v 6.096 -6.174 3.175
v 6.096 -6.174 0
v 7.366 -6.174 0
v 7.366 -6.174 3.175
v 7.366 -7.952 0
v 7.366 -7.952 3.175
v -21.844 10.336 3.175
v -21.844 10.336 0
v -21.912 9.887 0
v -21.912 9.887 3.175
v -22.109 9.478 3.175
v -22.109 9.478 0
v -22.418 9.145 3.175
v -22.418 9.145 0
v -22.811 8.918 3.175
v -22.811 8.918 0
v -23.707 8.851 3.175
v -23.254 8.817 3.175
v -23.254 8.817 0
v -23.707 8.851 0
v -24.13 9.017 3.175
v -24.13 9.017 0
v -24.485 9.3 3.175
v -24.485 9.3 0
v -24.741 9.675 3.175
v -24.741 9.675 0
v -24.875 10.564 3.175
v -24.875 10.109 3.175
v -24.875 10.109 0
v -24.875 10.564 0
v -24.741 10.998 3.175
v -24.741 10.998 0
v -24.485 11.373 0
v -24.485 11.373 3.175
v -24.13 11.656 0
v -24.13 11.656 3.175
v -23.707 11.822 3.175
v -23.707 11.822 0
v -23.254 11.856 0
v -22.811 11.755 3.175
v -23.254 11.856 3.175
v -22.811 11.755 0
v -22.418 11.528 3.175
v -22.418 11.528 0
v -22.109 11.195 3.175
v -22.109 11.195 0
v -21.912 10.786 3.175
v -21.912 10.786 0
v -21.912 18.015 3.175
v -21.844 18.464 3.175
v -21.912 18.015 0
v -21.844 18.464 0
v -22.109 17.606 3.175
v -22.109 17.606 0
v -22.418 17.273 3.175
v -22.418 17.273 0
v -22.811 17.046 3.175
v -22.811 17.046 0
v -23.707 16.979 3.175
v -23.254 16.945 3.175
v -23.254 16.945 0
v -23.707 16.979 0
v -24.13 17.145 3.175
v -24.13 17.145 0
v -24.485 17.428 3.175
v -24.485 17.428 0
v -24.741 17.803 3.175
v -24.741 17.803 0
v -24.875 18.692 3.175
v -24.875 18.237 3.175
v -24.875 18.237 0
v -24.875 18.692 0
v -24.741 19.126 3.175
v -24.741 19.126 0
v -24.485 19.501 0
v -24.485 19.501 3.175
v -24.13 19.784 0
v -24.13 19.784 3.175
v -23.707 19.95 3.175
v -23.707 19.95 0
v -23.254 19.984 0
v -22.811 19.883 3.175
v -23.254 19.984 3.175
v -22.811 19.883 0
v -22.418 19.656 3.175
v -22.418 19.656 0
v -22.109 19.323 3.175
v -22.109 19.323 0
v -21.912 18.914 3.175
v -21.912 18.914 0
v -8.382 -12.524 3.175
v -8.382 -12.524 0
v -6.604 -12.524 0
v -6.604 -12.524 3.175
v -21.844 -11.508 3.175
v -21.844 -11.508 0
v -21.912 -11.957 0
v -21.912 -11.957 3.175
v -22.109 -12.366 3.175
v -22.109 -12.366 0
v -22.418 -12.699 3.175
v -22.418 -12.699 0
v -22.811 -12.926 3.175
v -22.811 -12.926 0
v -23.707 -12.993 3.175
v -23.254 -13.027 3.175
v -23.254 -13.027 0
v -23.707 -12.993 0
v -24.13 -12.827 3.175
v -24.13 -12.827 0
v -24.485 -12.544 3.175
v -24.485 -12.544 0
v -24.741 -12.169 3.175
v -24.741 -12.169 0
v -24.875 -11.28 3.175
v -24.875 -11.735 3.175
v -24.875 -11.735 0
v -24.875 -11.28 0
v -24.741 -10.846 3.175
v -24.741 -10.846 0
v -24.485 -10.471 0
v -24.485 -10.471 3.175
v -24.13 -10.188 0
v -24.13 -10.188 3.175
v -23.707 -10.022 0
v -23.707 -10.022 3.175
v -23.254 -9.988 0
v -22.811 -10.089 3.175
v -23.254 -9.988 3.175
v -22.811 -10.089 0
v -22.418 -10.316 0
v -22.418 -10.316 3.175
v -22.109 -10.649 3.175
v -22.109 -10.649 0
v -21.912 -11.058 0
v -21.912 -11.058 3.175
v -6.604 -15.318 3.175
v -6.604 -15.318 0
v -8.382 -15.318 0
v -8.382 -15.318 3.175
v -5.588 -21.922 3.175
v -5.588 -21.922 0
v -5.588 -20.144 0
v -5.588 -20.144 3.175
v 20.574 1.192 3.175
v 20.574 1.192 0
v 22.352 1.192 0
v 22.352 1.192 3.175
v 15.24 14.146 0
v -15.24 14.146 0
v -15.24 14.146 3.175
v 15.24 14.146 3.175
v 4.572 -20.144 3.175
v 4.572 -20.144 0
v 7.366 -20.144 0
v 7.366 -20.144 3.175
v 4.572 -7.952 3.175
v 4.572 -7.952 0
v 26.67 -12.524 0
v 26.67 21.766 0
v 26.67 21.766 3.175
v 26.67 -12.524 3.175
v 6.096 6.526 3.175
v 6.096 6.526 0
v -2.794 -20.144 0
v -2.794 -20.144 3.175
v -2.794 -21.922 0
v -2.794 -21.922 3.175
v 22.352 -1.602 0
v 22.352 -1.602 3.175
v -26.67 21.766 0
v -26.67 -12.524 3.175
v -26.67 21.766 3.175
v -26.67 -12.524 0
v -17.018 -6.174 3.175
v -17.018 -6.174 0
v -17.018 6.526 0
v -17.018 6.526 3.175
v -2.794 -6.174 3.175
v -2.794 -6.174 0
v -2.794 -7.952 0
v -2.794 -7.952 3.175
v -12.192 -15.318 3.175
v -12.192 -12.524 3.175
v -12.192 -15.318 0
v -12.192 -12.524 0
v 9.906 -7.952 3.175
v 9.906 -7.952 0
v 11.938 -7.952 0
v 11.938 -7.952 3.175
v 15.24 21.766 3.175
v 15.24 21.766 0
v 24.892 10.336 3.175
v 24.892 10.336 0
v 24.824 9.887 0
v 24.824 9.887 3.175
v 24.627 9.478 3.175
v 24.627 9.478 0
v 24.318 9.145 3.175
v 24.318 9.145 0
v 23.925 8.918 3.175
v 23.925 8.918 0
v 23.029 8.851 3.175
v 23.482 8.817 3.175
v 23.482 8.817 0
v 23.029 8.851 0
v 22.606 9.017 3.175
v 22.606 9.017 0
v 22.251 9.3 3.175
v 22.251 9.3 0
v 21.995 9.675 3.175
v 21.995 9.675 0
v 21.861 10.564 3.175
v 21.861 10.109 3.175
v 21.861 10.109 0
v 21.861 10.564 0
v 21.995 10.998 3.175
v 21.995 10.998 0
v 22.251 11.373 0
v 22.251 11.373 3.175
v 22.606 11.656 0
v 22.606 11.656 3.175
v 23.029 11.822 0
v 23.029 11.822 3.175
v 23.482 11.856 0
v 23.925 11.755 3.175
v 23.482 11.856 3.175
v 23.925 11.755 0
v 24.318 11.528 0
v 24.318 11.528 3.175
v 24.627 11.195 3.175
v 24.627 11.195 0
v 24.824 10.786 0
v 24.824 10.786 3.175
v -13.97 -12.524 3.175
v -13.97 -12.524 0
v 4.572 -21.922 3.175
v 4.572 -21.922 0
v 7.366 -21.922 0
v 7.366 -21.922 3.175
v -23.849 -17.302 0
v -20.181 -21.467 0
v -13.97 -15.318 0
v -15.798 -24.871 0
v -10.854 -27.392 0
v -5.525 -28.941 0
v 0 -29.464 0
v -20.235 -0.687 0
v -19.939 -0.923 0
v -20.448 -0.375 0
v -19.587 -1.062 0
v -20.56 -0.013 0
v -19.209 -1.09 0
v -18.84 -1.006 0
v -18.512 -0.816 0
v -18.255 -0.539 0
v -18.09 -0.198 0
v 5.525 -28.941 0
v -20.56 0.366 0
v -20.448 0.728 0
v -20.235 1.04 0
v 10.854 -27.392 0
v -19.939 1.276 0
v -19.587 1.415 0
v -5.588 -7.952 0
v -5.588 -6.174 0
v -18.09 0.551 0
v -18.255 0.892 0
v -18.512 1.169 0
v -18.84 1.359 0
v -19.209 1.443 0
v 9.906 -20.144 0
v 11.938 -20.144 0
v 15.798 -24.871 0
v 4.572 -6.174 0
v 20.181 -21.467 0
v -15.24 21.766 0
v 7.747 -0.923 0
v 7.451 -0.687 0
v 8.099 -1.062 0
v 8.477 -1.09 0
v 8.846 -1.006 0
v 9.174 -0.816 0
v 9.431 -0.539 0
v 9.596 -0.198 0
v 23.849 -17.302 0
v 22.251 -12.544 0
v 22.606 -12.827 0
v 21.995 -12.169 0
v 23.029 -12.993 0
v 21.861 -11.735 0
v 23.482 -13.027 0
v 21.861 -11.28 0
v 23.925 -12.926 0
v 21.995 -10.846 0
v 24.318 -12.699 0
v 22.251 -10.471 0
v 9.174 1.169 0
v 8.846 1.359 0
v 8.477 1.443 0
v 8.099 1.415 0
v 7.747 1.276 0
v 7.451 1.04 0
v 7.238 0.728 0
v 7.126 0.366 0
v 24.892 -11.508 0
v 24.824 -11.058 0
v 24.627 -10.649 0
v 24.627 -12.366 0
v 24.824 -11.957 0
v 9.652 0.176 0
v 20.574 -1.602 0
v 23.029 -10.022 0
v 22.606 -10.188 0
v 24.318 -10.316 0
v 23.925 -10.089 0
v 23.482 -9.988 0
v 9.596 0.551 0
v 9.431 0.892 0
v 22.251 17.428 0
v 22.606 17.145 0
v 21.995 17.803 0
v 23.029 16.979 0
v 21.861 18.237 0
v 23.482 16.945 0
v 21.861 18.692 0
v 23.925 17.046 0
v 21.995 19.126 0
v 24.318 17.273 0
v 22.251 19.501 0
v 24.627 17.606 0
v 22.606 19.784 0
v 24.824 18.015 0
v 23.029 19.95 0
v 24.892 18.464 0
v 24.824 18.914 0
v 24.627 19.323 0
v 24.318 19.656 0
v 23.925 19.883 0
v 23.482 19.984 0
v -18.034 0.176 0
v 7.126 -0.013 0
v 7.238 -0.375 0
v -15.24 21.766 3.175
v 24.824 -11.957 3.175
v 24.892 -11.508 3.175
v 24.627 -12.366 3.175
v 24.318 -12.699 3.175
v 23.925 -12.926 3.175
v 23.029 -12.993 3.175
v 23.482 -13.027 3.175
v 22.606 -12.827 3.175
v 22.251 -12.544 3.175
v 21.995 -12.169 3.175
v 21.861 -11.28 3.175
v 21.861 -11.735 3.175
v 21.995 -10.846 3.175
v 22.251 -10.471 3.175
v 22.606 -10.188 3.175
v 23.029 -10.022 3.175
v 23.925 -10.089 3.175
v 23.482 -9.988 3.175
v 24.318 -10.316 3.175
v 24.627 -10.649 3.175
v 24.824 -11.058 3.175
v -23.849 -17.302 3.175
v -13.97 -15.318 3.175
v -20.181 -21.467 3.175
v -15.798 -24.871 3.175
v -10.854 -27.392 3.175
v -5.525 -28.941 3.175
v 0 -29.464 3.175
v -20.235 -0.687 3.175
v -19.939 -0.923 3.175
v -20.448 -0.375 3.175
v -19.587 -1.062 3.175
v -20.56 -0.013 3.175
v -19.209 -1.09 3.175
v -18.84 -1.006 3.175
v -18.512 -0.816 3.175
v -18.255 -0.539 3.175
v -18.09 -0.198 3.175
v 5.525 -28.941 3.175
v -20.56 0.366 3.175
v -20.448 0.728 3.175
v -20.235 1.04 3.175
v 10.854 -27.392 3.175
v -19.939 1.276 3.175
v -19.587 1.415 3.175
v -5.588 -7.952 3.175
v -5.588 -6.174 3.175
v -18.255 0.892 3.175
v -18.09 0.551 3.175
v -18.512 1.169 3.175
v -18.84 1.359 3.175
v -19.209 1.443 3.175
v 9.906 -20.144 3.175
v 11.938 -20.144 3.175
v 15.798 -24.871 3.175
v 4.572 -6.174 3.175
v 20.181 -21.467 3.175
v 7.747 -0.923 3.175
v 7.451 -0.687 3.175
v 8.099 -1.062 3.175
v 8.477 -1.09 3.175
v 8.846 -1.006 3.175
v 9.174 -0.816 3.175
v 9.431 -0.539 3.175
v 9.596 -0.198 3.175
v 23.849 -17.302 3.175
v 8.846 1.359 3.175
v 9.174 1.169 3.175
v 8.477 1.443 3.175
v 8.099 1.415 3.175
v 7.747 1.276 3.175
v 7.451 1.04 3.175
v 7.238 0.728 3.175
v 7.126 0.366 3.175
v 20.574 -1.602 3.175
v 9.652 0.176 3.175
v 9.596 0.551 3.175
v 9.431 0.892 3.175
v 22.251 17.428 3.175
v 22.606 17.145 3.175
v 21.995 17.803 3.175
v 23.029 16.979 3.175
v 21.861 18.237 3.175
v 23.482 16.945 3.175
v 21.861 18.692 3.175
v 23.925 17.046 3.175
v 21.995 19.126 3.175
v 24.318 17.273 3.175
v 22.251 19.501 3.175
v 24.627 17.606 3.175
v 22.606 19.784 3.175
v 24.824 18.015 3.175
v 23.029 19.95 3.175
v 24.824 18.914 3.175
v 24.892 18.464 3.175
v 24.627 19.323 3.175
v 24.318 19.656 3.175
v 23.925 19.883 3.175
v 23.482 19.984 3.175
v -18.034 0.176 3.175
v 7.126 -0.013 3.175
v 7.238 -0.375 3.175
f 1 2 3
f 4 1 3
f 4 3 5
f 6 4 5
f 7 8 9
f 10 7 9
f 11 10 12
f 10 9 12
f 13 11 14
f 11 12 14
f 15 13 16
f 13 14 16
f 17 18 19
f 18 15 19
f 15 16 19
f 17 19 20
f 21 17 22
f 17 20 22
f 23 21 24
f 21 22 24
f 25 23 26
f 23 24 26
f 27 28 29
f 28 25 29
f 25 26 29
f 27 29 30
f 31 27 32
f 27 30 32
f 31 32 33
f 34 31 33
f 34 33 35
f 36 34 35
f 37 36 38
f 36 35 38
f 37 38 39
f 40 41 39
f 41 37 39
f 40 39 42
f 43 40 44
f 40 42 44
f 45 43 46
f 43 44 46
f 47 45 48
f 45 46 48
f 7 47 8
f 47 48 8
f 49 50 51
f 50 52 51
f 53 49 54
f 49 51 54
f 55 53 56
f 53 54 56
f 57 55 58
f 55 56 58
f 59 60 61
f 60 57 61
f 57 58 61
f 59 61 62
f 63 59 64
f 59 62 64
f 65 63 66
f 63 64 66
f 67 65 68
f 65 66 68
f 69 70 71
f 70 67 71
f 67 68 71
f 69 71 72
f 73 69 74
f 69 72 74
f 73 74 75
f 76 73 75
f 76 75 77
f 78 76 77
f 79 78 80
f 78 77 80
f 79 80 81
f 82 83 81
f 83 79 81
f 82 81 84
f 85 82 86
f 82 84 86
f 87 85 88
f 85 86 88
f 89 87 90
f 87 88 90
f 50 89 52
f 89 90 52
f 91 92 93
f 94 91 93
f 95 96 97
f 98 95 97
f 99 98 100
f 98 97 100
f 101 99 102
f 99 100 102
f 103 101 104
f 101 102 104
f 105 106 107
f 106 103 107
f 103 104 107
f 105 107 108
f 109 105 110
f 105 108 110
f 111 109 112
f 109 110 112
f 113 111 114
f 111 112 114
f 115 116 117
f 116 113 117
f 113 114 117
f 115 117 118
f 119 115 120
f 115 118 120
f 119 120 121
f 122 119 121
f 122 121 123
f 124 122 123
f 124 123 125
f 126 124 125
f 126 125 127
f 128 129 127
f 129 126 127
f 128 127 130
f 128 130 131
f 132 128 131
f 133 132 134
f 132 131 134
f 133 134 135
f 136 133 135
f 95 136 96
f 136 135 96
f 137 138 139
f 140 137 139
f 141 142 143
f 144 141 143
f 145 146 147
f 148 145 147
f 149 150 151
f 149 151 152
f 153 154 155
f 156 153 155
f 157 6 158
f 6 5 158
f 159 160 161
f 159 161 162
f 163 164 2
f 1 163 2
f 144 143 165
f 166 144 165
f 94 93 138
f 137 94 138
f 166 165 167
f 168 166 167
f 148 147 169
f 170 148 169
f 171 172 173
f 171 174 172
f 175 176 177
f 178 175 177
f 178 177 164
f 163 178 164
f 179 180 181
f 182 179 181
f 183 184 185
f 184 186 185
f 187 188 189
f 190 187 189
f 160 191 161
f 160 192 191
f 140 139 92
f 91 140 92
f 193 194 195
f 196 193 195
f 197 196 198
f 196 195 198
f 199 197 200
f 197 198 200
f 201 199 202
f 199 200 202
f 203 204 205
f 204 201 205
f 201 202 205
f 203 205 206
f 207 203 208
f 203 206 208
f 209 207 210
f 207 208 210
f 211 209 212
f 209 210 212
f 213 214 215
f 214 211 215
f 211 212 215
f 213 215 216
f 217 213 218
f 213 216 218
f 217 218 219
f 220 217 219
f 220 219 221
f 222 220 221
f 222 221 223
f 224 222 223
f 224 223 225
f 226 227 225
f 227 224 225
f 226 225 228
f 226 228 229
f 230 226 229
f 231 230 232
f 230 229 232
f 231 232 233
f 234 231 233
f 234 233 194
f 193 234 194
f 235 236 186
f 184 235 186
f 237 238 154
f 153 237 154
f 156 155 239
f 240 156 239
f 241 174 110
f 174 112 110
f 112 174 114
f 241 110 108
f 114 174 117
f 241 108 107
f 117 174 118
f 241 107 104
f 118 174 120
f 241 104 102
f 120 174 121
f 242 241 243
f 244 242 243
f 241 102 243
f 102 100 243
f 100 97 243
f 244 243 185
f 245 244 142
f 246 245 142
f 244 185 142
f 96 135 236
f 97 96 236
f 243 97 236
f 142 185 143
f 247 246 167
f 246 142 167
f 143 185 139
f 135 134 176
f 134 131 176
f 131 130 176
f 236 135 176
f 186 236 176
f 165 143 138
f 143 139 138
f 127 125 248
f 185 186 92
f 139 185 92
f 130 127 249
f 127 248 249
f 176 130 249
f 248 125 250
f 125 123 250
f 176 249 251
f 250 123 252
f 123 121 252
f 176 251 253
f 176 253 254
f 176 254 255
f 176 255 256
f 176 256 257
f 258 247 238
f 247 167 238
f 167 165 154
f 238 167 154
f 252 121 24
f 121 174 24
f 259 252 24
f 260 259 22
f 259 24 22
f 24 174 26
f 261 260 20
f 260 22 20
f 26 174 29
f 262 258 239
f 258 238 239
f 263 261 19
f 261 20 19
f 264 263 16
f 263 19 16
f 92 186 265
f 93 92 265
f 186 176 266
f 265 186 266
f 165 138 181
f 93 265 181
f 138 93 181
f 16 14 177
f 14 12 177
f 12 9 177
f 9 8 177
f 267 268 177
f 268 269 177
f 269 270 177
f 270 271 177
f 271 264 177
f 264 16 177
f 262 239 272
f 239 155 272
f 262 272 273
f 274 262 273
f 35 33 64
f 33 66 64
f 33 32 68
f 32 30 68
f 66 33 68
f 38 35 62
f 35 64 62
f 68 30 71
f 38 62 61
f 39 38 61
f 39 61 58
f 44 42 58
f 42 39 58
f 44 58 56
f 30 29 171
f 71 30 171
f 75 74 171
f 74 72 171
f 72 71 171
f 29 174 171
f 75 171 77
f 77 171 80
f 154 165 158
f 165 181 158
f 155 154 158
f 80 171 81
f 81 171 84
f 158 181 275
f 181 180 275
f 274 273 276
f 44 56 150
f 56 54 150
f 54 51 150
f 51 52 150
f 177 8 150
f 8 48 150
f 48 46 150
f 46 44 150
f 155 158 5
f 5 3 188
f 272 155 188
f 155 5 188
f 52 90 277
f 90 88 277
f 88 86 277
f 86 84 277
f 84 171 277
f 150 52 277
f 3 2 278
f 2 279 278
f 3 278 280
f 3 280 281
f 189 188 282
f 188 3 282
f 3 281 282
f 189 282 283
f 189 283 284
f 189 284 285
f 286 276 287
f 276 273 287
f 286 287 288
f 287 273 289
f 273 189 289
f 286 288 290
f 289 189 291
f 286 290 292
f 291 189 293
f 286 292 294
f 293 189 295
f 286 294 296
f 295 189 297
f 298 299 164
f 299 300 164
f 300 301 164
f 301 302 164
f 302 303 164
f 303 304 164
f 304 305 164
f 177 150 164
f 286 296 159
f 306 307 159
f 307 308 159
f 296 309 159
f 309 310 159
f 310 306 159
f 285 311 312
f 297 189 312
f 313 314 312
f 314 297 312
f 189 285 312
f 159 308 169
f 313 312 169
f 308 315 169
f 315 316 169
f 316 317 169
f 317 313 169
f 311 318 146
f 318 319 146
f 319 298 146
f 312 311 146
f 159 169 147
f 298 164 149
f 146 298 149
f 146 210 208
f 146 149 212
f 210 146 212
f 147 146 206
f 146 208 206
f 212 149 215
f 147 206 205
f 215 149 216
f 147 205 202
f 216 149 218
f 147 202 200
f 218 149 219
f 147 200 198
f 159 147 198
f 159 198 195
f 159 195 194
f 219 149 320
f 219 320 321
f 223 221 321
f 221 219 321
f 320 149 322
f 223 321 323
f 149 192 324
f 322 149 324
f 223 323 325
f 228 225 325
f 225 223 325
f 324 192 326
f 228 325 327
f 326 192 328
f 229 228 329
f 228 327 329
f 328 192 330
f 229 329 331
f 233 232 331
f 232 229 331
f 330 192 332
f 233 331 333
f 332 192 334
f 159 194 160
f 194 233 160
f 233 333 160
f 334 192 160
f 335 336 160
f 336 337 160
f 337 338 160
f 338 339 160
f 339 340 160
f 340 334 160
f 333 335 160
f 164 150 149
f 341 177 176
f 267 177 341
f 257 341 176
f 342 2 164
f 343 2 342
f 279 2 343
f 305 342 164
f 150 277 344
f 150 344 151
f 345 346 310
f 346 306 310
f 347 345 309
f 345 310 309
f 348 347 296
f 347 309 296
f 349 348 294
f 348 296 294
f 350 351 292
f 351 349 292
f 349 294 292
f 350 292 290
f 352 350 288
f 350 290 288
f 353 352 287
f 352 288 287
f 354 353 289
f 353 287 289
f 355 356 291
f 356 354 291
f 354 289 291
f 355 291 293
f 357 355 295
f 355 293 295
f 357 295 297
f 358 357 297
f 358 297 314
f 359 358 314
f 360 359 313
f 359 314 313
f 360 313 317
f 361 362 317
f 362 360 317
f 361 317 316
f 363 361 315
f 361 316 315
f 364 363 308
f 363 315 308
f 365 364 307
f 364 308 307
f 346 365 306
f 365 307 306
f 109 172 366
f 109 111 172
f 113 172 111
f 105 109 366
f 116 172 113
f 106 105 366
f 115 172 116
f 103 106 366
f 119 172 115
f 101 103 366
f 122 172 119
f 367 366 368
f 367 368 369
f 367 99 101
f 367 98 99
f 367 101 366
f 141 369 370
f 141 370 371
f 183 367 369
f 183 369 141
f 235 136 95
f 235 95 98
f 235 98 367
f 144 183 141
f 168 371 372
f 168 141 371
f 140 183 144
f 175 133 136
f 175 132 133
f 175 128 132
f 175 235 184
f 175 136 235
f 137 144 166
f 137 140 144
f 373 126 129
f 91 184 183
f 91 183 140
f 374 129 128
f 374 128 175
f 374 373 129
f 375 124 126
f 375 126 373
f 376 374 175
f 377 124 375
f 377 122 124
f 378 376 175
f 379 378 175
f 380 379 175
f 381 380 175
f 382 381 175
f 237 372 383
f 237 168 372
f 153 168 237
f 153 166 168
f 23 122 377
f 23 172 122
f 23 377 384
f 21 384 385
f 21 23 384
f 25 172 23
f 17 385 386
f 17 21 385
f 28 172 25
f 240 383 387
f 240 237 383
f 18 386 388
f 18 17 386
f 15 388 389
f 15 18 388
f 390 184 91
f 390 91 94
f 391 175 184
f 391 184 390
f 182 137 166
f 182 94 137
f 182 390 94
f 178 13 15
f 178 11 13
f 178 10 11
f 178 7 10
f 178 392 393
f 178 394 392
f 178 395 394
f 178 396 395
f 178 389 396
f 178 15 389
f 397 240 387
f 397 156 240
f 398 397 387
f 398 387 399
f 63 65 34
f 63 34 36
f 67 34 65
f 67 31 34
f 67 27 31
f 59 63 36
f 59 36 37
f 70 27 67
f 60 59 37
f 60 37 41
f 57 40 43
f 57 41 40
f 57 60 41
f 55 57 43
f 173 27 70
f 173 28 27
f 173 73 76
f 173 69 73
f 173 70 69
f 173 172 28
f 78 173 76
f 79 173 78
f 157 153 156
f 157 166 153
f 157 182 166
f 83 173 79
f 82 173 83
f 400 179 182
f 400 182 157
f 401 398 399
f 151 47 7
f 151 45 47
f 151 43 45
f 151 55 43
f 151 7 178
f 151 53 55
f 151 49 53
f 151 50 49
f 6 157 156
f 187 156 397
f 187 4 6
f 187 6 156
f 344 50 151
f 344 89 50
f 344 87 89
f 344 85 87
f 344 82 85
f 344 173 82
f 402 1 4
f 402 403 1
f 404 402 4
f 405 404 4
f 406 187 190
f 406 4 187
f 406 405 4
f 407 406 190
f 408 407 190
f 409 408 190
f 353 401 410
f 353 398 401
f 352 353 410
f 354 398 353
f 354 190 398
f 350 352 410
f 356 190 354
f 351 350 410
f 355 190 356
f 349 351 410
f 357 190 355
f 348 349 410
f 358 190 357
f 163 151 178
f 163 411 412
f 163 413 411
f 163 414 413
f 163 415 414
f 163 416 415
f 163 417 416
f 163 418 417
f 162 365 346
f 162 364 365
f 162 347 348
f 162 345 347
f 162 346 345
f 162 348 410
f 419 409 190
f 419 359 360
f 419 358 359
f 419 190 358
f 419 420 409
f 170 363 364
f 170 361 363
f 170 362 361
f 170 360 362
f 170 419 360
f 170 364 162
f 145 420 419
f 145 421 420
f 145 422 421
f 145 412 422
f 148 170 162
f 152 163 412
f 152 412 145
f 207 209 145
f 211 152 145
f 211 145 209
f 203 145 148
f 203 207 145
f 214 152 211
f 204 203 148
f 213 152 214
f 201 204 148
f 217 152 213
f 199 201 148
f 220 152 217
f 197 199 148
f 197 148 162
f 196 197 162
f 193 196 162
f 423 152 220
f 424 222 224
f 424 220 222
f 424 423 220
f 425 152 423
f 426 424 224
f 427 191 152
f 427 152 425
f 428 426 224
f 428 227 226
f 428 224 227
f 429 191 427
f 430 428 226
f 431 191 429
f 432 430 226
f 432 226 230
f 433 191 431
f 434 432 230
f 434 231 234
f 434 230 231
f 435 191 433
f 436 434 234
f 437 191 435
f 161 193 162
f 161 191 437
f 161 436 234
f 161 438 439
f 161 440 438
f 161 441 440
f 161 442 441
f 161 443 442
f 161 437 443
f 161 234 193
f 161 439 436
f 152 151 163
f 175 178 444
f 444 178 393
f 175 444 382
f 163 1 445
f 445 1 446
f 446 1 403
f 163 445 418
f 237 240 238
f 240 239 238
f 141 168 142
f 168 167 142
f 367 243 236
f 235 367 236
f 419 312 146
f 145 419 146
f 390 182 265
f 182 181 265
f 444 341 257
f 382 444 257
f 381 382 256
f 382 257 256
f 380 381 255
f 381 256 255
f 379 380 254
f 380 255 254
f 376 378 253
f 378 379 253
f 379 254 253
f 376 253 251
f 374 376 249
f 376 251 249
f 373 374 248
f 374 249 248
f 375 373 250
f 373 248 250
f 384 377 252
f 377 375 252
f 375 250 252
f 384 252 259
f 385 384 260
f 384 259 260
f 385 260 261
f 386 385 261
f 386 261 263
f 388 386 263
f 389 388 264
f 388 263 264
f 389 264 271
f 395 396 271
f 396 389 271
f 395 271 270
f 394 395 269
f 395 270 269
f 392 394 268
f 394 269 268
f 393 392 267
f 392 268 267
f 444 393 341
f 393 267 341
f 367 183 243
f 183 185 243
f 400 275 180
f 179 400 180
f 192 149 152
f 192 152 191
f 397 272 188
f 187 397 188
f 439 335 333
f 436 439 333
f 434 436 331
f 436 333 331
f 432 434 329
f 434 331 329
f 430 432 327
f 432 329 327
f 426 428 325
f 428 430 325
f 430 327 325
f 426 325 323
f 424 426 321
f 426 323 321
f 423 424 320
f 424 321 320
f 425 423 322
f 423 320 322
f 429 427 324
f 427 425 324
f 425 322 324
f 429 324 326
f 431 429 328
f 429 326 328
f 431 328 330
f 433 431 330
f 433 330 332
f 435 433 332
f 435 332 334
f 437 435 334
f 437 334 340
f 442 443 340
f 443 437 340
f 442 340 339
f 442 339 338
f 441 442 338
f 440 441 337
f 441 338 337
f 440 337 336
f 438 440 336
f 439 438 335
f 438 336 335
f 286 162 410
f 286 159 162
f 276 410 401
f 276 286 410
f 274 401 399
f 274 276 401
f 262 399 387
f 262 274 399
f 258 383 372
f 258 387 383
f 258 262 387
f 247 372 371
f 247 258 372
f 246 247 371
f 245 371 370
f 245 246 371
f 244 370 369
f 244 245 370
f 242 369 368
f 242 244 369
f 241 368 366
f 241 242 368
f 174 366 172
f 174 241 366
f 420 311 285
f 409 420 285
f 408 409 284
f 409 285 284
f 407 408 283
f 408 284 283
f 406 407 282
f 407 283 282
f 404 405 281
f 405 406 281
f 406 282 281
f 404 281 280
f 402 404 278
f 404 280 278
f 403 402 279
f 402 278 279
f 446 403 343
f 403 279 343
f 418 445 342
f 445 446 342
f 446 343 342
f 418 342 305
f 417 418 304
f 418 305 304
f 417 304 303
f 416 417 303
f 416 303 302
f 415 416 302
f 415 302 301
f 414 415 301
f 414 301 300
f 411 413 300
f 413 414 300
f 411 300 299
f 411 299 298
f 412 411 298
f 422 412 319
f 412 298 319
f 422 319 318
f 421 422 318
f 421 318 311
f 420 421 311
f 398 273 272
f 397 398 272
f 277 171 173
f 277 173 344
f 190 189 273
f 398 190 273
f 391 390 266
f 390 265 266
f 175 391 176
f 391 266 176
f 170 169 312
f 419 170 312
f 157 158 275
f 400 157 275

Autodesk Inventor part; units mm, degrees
ref_plane "YZ Plane" through (0, 0, 0) normal (1, 0, 0) x (0, 1, 0)
ref_plane "XZ Plane" through (0, 0, 0) normal (0, 1, 0) x (-1, 0, 0)
ref_plane "XY Plane" through (0, 0, 0) normal (0, 0, 1) x (1, 0, 0)
sketch "Sketch1" plane through (0, 0, 0) normal (0, 0, 1) x (1, 0, 0)
  arc A0 (-26.67, -12.5235) -> (26.67, -12.5235) centre (0, 0) ccw
  line L0 (-26.67, -12.5235) -> (-26.67, 21.7665)
  line L1 (-26.67, 21.7665) -> (-15.24, 21.7665)
  line L2 (-15.24, 21.7665) -> (-15.24, 14.1465)
  line L3 (-15.24, 14.1465) -> (15.24, 14.1465)
  line L4 (15.24, 14.1465) -> (15.24, 21.7665)
  line L5 (15.24, 21.7665) -> (26.67, 21.7665)
  line L6 (26.67, 21.7665) -> (26.67, -12.5235)
  line L7 (-17.018, 6.5265) -> (6.096, 6.5265)
  line L8 (6.096, 6.5265) -> (6.096, -6.1735)
  line L9 (6.096, -6.1735) -> (-17.018, -6.1735)
  line L10 (-17.018, -6.1735) -> (-17.018, 6.5265)
  line L11 (-5.588, -6.1735) -> (-2.794, -6.1735)
  line L12 (-2.794, -6.1735) -> (-2.794, -7.9515)
  line L13 (-2.794, -7.9515) -> (-5.588, -7.9515)
  line L14 (-5.588, -7.9515) -> (-5.588, -6.1735)
  line L15 (4.572, -6.1735) -> (7.366, -6.1735)
  line L16 (7.366, -6.1735) -> (7.366, -7.9515)
  line L17 (7.366, -7.9515) -> (4.572, -7.9515)
  line L18 (4.572, -7.9515) -> (4.572, -6.1735)
  line L19 (9.906, -7.9515) -> (11.938, -7.9515)
  line L20 (11.938, -7.9515) -> (11.938, -20.1435)
  line L21 (11.938, -20.1435) -> (9.906, -20.1435)
  line L22 (9.906, -20.1435) -> (9.906, -7.9515)
  line L23 (-5.588, -20.1435) -> (-2.794, -20.1435)
  line L24 (-2.794, -20.1435) -> (-2.794, -21.9215)
  line L25 (-2.794, -21.9215) -> (-5.588, -21.9215)
  line L26 (-5.588, -21.9215) -> (-5.588, -20.1435)
  line L27 (-8.382, -12.5235) -> (-6.604, -12.5235)
  line L28 (-6.604, -12.5235) -> (-6.604, -15.3175)
  line L29 (-6.604, -15.3175) -> (-8.382, -15.3175)
  line L30 (-8.382, -15.3175) -> (-8.382, -12.5235)
  line L31 (-13.97, -12.5235) -> (-12.192, -12.5235)
  line L32 (-12.192, -12.5235) -> (-12.192, -15.3175)
  line L33 (-12.192, -15.3175) -> (-13.97, -15.3175)
  line L34 (-13.97, -15.3175) -> (-13.97, -12.5235)
  line L35 (20.574, 1.1925) -> (22.352, 1.1925)
  line L36 (22.352, 1.1925) -> (22.352, -1.6015)
  line L37 (22.352, -1.6015) -> (20.574, -1.6015)
  line L38 (20.574, -1.6015) -> (20.574, 1.1925)
  line L39 (4.572, -20.1435) -> (7.366, -20.1435)
  line L40 (7.366, -20.1435) -> (7.366, -21.9215)
  line L41 (7.366, -21.9215) -> (4.572, -21.9215)
  line L42 (4.572, -21.9215) -> (4.572, -20.1435)
  circle A1 centre (-23.368, 18.4645) radius 1.524
  circle A2 centre (-23.368, 10.3365) radius 1.524
  circle A3 centre (-23.368, -11.5075) radius 1.524
  circle A4 centre (-19.304, 0.1765) radius 1.27
  circle A5 centre (8.382, 0.1765) radius 1.27
  circle A6 centre (23.368, 18.4645) radius 1.524
  circle A7 centre (23.368, 10.3365) radius 1.524
  circle A8 centre (23.368, -11.5075) radius 1.524
  dimension "d0" = 29.464
  dimension "d1" = 34.29
  dimension "d2" = 11.43
  dimension "d3" = 7.62
  dimension "d4" = 30.48
  dimension "d5" = 2.794
  dimension "d6" = 12.7
  dimension "d7" = 23.114
  dimension "d8" = 7.62
  dimension "d9" = 9.652
  dimension "d10" = 1.778
  dimension "d11" = 12.954
  dimension "d12" = 4.318
  dimension "d13" = 12.192
  dimension "d14" = 7.366
  dimension "d15" = 2.032
  dimension "d16" = 2.54
  dimension "d17" = 1.27
  dimension "d18" = 1.016
  dimension "d19" = 4.572
  dimension "d20" = 3.81
  dimension "d21" = 3.048
  dimension "d22" = 2.54
  dimension "d23" = 3.302
  dimension "d24" = 3.302
  dimension "d25" = 3.302
  dimension "d26" = 3.302
  dimension "d27" = 8.128
  dimension "d28" = 21.844
  dimension "d29" = 2.286
  dimension "d30" = 2.286
  dimension "d31" = 6.35
extrude "Extrusion1" add sketch "Sketch1" along normal blind 3.175
properties part number "PixyCamGimbal Body"
